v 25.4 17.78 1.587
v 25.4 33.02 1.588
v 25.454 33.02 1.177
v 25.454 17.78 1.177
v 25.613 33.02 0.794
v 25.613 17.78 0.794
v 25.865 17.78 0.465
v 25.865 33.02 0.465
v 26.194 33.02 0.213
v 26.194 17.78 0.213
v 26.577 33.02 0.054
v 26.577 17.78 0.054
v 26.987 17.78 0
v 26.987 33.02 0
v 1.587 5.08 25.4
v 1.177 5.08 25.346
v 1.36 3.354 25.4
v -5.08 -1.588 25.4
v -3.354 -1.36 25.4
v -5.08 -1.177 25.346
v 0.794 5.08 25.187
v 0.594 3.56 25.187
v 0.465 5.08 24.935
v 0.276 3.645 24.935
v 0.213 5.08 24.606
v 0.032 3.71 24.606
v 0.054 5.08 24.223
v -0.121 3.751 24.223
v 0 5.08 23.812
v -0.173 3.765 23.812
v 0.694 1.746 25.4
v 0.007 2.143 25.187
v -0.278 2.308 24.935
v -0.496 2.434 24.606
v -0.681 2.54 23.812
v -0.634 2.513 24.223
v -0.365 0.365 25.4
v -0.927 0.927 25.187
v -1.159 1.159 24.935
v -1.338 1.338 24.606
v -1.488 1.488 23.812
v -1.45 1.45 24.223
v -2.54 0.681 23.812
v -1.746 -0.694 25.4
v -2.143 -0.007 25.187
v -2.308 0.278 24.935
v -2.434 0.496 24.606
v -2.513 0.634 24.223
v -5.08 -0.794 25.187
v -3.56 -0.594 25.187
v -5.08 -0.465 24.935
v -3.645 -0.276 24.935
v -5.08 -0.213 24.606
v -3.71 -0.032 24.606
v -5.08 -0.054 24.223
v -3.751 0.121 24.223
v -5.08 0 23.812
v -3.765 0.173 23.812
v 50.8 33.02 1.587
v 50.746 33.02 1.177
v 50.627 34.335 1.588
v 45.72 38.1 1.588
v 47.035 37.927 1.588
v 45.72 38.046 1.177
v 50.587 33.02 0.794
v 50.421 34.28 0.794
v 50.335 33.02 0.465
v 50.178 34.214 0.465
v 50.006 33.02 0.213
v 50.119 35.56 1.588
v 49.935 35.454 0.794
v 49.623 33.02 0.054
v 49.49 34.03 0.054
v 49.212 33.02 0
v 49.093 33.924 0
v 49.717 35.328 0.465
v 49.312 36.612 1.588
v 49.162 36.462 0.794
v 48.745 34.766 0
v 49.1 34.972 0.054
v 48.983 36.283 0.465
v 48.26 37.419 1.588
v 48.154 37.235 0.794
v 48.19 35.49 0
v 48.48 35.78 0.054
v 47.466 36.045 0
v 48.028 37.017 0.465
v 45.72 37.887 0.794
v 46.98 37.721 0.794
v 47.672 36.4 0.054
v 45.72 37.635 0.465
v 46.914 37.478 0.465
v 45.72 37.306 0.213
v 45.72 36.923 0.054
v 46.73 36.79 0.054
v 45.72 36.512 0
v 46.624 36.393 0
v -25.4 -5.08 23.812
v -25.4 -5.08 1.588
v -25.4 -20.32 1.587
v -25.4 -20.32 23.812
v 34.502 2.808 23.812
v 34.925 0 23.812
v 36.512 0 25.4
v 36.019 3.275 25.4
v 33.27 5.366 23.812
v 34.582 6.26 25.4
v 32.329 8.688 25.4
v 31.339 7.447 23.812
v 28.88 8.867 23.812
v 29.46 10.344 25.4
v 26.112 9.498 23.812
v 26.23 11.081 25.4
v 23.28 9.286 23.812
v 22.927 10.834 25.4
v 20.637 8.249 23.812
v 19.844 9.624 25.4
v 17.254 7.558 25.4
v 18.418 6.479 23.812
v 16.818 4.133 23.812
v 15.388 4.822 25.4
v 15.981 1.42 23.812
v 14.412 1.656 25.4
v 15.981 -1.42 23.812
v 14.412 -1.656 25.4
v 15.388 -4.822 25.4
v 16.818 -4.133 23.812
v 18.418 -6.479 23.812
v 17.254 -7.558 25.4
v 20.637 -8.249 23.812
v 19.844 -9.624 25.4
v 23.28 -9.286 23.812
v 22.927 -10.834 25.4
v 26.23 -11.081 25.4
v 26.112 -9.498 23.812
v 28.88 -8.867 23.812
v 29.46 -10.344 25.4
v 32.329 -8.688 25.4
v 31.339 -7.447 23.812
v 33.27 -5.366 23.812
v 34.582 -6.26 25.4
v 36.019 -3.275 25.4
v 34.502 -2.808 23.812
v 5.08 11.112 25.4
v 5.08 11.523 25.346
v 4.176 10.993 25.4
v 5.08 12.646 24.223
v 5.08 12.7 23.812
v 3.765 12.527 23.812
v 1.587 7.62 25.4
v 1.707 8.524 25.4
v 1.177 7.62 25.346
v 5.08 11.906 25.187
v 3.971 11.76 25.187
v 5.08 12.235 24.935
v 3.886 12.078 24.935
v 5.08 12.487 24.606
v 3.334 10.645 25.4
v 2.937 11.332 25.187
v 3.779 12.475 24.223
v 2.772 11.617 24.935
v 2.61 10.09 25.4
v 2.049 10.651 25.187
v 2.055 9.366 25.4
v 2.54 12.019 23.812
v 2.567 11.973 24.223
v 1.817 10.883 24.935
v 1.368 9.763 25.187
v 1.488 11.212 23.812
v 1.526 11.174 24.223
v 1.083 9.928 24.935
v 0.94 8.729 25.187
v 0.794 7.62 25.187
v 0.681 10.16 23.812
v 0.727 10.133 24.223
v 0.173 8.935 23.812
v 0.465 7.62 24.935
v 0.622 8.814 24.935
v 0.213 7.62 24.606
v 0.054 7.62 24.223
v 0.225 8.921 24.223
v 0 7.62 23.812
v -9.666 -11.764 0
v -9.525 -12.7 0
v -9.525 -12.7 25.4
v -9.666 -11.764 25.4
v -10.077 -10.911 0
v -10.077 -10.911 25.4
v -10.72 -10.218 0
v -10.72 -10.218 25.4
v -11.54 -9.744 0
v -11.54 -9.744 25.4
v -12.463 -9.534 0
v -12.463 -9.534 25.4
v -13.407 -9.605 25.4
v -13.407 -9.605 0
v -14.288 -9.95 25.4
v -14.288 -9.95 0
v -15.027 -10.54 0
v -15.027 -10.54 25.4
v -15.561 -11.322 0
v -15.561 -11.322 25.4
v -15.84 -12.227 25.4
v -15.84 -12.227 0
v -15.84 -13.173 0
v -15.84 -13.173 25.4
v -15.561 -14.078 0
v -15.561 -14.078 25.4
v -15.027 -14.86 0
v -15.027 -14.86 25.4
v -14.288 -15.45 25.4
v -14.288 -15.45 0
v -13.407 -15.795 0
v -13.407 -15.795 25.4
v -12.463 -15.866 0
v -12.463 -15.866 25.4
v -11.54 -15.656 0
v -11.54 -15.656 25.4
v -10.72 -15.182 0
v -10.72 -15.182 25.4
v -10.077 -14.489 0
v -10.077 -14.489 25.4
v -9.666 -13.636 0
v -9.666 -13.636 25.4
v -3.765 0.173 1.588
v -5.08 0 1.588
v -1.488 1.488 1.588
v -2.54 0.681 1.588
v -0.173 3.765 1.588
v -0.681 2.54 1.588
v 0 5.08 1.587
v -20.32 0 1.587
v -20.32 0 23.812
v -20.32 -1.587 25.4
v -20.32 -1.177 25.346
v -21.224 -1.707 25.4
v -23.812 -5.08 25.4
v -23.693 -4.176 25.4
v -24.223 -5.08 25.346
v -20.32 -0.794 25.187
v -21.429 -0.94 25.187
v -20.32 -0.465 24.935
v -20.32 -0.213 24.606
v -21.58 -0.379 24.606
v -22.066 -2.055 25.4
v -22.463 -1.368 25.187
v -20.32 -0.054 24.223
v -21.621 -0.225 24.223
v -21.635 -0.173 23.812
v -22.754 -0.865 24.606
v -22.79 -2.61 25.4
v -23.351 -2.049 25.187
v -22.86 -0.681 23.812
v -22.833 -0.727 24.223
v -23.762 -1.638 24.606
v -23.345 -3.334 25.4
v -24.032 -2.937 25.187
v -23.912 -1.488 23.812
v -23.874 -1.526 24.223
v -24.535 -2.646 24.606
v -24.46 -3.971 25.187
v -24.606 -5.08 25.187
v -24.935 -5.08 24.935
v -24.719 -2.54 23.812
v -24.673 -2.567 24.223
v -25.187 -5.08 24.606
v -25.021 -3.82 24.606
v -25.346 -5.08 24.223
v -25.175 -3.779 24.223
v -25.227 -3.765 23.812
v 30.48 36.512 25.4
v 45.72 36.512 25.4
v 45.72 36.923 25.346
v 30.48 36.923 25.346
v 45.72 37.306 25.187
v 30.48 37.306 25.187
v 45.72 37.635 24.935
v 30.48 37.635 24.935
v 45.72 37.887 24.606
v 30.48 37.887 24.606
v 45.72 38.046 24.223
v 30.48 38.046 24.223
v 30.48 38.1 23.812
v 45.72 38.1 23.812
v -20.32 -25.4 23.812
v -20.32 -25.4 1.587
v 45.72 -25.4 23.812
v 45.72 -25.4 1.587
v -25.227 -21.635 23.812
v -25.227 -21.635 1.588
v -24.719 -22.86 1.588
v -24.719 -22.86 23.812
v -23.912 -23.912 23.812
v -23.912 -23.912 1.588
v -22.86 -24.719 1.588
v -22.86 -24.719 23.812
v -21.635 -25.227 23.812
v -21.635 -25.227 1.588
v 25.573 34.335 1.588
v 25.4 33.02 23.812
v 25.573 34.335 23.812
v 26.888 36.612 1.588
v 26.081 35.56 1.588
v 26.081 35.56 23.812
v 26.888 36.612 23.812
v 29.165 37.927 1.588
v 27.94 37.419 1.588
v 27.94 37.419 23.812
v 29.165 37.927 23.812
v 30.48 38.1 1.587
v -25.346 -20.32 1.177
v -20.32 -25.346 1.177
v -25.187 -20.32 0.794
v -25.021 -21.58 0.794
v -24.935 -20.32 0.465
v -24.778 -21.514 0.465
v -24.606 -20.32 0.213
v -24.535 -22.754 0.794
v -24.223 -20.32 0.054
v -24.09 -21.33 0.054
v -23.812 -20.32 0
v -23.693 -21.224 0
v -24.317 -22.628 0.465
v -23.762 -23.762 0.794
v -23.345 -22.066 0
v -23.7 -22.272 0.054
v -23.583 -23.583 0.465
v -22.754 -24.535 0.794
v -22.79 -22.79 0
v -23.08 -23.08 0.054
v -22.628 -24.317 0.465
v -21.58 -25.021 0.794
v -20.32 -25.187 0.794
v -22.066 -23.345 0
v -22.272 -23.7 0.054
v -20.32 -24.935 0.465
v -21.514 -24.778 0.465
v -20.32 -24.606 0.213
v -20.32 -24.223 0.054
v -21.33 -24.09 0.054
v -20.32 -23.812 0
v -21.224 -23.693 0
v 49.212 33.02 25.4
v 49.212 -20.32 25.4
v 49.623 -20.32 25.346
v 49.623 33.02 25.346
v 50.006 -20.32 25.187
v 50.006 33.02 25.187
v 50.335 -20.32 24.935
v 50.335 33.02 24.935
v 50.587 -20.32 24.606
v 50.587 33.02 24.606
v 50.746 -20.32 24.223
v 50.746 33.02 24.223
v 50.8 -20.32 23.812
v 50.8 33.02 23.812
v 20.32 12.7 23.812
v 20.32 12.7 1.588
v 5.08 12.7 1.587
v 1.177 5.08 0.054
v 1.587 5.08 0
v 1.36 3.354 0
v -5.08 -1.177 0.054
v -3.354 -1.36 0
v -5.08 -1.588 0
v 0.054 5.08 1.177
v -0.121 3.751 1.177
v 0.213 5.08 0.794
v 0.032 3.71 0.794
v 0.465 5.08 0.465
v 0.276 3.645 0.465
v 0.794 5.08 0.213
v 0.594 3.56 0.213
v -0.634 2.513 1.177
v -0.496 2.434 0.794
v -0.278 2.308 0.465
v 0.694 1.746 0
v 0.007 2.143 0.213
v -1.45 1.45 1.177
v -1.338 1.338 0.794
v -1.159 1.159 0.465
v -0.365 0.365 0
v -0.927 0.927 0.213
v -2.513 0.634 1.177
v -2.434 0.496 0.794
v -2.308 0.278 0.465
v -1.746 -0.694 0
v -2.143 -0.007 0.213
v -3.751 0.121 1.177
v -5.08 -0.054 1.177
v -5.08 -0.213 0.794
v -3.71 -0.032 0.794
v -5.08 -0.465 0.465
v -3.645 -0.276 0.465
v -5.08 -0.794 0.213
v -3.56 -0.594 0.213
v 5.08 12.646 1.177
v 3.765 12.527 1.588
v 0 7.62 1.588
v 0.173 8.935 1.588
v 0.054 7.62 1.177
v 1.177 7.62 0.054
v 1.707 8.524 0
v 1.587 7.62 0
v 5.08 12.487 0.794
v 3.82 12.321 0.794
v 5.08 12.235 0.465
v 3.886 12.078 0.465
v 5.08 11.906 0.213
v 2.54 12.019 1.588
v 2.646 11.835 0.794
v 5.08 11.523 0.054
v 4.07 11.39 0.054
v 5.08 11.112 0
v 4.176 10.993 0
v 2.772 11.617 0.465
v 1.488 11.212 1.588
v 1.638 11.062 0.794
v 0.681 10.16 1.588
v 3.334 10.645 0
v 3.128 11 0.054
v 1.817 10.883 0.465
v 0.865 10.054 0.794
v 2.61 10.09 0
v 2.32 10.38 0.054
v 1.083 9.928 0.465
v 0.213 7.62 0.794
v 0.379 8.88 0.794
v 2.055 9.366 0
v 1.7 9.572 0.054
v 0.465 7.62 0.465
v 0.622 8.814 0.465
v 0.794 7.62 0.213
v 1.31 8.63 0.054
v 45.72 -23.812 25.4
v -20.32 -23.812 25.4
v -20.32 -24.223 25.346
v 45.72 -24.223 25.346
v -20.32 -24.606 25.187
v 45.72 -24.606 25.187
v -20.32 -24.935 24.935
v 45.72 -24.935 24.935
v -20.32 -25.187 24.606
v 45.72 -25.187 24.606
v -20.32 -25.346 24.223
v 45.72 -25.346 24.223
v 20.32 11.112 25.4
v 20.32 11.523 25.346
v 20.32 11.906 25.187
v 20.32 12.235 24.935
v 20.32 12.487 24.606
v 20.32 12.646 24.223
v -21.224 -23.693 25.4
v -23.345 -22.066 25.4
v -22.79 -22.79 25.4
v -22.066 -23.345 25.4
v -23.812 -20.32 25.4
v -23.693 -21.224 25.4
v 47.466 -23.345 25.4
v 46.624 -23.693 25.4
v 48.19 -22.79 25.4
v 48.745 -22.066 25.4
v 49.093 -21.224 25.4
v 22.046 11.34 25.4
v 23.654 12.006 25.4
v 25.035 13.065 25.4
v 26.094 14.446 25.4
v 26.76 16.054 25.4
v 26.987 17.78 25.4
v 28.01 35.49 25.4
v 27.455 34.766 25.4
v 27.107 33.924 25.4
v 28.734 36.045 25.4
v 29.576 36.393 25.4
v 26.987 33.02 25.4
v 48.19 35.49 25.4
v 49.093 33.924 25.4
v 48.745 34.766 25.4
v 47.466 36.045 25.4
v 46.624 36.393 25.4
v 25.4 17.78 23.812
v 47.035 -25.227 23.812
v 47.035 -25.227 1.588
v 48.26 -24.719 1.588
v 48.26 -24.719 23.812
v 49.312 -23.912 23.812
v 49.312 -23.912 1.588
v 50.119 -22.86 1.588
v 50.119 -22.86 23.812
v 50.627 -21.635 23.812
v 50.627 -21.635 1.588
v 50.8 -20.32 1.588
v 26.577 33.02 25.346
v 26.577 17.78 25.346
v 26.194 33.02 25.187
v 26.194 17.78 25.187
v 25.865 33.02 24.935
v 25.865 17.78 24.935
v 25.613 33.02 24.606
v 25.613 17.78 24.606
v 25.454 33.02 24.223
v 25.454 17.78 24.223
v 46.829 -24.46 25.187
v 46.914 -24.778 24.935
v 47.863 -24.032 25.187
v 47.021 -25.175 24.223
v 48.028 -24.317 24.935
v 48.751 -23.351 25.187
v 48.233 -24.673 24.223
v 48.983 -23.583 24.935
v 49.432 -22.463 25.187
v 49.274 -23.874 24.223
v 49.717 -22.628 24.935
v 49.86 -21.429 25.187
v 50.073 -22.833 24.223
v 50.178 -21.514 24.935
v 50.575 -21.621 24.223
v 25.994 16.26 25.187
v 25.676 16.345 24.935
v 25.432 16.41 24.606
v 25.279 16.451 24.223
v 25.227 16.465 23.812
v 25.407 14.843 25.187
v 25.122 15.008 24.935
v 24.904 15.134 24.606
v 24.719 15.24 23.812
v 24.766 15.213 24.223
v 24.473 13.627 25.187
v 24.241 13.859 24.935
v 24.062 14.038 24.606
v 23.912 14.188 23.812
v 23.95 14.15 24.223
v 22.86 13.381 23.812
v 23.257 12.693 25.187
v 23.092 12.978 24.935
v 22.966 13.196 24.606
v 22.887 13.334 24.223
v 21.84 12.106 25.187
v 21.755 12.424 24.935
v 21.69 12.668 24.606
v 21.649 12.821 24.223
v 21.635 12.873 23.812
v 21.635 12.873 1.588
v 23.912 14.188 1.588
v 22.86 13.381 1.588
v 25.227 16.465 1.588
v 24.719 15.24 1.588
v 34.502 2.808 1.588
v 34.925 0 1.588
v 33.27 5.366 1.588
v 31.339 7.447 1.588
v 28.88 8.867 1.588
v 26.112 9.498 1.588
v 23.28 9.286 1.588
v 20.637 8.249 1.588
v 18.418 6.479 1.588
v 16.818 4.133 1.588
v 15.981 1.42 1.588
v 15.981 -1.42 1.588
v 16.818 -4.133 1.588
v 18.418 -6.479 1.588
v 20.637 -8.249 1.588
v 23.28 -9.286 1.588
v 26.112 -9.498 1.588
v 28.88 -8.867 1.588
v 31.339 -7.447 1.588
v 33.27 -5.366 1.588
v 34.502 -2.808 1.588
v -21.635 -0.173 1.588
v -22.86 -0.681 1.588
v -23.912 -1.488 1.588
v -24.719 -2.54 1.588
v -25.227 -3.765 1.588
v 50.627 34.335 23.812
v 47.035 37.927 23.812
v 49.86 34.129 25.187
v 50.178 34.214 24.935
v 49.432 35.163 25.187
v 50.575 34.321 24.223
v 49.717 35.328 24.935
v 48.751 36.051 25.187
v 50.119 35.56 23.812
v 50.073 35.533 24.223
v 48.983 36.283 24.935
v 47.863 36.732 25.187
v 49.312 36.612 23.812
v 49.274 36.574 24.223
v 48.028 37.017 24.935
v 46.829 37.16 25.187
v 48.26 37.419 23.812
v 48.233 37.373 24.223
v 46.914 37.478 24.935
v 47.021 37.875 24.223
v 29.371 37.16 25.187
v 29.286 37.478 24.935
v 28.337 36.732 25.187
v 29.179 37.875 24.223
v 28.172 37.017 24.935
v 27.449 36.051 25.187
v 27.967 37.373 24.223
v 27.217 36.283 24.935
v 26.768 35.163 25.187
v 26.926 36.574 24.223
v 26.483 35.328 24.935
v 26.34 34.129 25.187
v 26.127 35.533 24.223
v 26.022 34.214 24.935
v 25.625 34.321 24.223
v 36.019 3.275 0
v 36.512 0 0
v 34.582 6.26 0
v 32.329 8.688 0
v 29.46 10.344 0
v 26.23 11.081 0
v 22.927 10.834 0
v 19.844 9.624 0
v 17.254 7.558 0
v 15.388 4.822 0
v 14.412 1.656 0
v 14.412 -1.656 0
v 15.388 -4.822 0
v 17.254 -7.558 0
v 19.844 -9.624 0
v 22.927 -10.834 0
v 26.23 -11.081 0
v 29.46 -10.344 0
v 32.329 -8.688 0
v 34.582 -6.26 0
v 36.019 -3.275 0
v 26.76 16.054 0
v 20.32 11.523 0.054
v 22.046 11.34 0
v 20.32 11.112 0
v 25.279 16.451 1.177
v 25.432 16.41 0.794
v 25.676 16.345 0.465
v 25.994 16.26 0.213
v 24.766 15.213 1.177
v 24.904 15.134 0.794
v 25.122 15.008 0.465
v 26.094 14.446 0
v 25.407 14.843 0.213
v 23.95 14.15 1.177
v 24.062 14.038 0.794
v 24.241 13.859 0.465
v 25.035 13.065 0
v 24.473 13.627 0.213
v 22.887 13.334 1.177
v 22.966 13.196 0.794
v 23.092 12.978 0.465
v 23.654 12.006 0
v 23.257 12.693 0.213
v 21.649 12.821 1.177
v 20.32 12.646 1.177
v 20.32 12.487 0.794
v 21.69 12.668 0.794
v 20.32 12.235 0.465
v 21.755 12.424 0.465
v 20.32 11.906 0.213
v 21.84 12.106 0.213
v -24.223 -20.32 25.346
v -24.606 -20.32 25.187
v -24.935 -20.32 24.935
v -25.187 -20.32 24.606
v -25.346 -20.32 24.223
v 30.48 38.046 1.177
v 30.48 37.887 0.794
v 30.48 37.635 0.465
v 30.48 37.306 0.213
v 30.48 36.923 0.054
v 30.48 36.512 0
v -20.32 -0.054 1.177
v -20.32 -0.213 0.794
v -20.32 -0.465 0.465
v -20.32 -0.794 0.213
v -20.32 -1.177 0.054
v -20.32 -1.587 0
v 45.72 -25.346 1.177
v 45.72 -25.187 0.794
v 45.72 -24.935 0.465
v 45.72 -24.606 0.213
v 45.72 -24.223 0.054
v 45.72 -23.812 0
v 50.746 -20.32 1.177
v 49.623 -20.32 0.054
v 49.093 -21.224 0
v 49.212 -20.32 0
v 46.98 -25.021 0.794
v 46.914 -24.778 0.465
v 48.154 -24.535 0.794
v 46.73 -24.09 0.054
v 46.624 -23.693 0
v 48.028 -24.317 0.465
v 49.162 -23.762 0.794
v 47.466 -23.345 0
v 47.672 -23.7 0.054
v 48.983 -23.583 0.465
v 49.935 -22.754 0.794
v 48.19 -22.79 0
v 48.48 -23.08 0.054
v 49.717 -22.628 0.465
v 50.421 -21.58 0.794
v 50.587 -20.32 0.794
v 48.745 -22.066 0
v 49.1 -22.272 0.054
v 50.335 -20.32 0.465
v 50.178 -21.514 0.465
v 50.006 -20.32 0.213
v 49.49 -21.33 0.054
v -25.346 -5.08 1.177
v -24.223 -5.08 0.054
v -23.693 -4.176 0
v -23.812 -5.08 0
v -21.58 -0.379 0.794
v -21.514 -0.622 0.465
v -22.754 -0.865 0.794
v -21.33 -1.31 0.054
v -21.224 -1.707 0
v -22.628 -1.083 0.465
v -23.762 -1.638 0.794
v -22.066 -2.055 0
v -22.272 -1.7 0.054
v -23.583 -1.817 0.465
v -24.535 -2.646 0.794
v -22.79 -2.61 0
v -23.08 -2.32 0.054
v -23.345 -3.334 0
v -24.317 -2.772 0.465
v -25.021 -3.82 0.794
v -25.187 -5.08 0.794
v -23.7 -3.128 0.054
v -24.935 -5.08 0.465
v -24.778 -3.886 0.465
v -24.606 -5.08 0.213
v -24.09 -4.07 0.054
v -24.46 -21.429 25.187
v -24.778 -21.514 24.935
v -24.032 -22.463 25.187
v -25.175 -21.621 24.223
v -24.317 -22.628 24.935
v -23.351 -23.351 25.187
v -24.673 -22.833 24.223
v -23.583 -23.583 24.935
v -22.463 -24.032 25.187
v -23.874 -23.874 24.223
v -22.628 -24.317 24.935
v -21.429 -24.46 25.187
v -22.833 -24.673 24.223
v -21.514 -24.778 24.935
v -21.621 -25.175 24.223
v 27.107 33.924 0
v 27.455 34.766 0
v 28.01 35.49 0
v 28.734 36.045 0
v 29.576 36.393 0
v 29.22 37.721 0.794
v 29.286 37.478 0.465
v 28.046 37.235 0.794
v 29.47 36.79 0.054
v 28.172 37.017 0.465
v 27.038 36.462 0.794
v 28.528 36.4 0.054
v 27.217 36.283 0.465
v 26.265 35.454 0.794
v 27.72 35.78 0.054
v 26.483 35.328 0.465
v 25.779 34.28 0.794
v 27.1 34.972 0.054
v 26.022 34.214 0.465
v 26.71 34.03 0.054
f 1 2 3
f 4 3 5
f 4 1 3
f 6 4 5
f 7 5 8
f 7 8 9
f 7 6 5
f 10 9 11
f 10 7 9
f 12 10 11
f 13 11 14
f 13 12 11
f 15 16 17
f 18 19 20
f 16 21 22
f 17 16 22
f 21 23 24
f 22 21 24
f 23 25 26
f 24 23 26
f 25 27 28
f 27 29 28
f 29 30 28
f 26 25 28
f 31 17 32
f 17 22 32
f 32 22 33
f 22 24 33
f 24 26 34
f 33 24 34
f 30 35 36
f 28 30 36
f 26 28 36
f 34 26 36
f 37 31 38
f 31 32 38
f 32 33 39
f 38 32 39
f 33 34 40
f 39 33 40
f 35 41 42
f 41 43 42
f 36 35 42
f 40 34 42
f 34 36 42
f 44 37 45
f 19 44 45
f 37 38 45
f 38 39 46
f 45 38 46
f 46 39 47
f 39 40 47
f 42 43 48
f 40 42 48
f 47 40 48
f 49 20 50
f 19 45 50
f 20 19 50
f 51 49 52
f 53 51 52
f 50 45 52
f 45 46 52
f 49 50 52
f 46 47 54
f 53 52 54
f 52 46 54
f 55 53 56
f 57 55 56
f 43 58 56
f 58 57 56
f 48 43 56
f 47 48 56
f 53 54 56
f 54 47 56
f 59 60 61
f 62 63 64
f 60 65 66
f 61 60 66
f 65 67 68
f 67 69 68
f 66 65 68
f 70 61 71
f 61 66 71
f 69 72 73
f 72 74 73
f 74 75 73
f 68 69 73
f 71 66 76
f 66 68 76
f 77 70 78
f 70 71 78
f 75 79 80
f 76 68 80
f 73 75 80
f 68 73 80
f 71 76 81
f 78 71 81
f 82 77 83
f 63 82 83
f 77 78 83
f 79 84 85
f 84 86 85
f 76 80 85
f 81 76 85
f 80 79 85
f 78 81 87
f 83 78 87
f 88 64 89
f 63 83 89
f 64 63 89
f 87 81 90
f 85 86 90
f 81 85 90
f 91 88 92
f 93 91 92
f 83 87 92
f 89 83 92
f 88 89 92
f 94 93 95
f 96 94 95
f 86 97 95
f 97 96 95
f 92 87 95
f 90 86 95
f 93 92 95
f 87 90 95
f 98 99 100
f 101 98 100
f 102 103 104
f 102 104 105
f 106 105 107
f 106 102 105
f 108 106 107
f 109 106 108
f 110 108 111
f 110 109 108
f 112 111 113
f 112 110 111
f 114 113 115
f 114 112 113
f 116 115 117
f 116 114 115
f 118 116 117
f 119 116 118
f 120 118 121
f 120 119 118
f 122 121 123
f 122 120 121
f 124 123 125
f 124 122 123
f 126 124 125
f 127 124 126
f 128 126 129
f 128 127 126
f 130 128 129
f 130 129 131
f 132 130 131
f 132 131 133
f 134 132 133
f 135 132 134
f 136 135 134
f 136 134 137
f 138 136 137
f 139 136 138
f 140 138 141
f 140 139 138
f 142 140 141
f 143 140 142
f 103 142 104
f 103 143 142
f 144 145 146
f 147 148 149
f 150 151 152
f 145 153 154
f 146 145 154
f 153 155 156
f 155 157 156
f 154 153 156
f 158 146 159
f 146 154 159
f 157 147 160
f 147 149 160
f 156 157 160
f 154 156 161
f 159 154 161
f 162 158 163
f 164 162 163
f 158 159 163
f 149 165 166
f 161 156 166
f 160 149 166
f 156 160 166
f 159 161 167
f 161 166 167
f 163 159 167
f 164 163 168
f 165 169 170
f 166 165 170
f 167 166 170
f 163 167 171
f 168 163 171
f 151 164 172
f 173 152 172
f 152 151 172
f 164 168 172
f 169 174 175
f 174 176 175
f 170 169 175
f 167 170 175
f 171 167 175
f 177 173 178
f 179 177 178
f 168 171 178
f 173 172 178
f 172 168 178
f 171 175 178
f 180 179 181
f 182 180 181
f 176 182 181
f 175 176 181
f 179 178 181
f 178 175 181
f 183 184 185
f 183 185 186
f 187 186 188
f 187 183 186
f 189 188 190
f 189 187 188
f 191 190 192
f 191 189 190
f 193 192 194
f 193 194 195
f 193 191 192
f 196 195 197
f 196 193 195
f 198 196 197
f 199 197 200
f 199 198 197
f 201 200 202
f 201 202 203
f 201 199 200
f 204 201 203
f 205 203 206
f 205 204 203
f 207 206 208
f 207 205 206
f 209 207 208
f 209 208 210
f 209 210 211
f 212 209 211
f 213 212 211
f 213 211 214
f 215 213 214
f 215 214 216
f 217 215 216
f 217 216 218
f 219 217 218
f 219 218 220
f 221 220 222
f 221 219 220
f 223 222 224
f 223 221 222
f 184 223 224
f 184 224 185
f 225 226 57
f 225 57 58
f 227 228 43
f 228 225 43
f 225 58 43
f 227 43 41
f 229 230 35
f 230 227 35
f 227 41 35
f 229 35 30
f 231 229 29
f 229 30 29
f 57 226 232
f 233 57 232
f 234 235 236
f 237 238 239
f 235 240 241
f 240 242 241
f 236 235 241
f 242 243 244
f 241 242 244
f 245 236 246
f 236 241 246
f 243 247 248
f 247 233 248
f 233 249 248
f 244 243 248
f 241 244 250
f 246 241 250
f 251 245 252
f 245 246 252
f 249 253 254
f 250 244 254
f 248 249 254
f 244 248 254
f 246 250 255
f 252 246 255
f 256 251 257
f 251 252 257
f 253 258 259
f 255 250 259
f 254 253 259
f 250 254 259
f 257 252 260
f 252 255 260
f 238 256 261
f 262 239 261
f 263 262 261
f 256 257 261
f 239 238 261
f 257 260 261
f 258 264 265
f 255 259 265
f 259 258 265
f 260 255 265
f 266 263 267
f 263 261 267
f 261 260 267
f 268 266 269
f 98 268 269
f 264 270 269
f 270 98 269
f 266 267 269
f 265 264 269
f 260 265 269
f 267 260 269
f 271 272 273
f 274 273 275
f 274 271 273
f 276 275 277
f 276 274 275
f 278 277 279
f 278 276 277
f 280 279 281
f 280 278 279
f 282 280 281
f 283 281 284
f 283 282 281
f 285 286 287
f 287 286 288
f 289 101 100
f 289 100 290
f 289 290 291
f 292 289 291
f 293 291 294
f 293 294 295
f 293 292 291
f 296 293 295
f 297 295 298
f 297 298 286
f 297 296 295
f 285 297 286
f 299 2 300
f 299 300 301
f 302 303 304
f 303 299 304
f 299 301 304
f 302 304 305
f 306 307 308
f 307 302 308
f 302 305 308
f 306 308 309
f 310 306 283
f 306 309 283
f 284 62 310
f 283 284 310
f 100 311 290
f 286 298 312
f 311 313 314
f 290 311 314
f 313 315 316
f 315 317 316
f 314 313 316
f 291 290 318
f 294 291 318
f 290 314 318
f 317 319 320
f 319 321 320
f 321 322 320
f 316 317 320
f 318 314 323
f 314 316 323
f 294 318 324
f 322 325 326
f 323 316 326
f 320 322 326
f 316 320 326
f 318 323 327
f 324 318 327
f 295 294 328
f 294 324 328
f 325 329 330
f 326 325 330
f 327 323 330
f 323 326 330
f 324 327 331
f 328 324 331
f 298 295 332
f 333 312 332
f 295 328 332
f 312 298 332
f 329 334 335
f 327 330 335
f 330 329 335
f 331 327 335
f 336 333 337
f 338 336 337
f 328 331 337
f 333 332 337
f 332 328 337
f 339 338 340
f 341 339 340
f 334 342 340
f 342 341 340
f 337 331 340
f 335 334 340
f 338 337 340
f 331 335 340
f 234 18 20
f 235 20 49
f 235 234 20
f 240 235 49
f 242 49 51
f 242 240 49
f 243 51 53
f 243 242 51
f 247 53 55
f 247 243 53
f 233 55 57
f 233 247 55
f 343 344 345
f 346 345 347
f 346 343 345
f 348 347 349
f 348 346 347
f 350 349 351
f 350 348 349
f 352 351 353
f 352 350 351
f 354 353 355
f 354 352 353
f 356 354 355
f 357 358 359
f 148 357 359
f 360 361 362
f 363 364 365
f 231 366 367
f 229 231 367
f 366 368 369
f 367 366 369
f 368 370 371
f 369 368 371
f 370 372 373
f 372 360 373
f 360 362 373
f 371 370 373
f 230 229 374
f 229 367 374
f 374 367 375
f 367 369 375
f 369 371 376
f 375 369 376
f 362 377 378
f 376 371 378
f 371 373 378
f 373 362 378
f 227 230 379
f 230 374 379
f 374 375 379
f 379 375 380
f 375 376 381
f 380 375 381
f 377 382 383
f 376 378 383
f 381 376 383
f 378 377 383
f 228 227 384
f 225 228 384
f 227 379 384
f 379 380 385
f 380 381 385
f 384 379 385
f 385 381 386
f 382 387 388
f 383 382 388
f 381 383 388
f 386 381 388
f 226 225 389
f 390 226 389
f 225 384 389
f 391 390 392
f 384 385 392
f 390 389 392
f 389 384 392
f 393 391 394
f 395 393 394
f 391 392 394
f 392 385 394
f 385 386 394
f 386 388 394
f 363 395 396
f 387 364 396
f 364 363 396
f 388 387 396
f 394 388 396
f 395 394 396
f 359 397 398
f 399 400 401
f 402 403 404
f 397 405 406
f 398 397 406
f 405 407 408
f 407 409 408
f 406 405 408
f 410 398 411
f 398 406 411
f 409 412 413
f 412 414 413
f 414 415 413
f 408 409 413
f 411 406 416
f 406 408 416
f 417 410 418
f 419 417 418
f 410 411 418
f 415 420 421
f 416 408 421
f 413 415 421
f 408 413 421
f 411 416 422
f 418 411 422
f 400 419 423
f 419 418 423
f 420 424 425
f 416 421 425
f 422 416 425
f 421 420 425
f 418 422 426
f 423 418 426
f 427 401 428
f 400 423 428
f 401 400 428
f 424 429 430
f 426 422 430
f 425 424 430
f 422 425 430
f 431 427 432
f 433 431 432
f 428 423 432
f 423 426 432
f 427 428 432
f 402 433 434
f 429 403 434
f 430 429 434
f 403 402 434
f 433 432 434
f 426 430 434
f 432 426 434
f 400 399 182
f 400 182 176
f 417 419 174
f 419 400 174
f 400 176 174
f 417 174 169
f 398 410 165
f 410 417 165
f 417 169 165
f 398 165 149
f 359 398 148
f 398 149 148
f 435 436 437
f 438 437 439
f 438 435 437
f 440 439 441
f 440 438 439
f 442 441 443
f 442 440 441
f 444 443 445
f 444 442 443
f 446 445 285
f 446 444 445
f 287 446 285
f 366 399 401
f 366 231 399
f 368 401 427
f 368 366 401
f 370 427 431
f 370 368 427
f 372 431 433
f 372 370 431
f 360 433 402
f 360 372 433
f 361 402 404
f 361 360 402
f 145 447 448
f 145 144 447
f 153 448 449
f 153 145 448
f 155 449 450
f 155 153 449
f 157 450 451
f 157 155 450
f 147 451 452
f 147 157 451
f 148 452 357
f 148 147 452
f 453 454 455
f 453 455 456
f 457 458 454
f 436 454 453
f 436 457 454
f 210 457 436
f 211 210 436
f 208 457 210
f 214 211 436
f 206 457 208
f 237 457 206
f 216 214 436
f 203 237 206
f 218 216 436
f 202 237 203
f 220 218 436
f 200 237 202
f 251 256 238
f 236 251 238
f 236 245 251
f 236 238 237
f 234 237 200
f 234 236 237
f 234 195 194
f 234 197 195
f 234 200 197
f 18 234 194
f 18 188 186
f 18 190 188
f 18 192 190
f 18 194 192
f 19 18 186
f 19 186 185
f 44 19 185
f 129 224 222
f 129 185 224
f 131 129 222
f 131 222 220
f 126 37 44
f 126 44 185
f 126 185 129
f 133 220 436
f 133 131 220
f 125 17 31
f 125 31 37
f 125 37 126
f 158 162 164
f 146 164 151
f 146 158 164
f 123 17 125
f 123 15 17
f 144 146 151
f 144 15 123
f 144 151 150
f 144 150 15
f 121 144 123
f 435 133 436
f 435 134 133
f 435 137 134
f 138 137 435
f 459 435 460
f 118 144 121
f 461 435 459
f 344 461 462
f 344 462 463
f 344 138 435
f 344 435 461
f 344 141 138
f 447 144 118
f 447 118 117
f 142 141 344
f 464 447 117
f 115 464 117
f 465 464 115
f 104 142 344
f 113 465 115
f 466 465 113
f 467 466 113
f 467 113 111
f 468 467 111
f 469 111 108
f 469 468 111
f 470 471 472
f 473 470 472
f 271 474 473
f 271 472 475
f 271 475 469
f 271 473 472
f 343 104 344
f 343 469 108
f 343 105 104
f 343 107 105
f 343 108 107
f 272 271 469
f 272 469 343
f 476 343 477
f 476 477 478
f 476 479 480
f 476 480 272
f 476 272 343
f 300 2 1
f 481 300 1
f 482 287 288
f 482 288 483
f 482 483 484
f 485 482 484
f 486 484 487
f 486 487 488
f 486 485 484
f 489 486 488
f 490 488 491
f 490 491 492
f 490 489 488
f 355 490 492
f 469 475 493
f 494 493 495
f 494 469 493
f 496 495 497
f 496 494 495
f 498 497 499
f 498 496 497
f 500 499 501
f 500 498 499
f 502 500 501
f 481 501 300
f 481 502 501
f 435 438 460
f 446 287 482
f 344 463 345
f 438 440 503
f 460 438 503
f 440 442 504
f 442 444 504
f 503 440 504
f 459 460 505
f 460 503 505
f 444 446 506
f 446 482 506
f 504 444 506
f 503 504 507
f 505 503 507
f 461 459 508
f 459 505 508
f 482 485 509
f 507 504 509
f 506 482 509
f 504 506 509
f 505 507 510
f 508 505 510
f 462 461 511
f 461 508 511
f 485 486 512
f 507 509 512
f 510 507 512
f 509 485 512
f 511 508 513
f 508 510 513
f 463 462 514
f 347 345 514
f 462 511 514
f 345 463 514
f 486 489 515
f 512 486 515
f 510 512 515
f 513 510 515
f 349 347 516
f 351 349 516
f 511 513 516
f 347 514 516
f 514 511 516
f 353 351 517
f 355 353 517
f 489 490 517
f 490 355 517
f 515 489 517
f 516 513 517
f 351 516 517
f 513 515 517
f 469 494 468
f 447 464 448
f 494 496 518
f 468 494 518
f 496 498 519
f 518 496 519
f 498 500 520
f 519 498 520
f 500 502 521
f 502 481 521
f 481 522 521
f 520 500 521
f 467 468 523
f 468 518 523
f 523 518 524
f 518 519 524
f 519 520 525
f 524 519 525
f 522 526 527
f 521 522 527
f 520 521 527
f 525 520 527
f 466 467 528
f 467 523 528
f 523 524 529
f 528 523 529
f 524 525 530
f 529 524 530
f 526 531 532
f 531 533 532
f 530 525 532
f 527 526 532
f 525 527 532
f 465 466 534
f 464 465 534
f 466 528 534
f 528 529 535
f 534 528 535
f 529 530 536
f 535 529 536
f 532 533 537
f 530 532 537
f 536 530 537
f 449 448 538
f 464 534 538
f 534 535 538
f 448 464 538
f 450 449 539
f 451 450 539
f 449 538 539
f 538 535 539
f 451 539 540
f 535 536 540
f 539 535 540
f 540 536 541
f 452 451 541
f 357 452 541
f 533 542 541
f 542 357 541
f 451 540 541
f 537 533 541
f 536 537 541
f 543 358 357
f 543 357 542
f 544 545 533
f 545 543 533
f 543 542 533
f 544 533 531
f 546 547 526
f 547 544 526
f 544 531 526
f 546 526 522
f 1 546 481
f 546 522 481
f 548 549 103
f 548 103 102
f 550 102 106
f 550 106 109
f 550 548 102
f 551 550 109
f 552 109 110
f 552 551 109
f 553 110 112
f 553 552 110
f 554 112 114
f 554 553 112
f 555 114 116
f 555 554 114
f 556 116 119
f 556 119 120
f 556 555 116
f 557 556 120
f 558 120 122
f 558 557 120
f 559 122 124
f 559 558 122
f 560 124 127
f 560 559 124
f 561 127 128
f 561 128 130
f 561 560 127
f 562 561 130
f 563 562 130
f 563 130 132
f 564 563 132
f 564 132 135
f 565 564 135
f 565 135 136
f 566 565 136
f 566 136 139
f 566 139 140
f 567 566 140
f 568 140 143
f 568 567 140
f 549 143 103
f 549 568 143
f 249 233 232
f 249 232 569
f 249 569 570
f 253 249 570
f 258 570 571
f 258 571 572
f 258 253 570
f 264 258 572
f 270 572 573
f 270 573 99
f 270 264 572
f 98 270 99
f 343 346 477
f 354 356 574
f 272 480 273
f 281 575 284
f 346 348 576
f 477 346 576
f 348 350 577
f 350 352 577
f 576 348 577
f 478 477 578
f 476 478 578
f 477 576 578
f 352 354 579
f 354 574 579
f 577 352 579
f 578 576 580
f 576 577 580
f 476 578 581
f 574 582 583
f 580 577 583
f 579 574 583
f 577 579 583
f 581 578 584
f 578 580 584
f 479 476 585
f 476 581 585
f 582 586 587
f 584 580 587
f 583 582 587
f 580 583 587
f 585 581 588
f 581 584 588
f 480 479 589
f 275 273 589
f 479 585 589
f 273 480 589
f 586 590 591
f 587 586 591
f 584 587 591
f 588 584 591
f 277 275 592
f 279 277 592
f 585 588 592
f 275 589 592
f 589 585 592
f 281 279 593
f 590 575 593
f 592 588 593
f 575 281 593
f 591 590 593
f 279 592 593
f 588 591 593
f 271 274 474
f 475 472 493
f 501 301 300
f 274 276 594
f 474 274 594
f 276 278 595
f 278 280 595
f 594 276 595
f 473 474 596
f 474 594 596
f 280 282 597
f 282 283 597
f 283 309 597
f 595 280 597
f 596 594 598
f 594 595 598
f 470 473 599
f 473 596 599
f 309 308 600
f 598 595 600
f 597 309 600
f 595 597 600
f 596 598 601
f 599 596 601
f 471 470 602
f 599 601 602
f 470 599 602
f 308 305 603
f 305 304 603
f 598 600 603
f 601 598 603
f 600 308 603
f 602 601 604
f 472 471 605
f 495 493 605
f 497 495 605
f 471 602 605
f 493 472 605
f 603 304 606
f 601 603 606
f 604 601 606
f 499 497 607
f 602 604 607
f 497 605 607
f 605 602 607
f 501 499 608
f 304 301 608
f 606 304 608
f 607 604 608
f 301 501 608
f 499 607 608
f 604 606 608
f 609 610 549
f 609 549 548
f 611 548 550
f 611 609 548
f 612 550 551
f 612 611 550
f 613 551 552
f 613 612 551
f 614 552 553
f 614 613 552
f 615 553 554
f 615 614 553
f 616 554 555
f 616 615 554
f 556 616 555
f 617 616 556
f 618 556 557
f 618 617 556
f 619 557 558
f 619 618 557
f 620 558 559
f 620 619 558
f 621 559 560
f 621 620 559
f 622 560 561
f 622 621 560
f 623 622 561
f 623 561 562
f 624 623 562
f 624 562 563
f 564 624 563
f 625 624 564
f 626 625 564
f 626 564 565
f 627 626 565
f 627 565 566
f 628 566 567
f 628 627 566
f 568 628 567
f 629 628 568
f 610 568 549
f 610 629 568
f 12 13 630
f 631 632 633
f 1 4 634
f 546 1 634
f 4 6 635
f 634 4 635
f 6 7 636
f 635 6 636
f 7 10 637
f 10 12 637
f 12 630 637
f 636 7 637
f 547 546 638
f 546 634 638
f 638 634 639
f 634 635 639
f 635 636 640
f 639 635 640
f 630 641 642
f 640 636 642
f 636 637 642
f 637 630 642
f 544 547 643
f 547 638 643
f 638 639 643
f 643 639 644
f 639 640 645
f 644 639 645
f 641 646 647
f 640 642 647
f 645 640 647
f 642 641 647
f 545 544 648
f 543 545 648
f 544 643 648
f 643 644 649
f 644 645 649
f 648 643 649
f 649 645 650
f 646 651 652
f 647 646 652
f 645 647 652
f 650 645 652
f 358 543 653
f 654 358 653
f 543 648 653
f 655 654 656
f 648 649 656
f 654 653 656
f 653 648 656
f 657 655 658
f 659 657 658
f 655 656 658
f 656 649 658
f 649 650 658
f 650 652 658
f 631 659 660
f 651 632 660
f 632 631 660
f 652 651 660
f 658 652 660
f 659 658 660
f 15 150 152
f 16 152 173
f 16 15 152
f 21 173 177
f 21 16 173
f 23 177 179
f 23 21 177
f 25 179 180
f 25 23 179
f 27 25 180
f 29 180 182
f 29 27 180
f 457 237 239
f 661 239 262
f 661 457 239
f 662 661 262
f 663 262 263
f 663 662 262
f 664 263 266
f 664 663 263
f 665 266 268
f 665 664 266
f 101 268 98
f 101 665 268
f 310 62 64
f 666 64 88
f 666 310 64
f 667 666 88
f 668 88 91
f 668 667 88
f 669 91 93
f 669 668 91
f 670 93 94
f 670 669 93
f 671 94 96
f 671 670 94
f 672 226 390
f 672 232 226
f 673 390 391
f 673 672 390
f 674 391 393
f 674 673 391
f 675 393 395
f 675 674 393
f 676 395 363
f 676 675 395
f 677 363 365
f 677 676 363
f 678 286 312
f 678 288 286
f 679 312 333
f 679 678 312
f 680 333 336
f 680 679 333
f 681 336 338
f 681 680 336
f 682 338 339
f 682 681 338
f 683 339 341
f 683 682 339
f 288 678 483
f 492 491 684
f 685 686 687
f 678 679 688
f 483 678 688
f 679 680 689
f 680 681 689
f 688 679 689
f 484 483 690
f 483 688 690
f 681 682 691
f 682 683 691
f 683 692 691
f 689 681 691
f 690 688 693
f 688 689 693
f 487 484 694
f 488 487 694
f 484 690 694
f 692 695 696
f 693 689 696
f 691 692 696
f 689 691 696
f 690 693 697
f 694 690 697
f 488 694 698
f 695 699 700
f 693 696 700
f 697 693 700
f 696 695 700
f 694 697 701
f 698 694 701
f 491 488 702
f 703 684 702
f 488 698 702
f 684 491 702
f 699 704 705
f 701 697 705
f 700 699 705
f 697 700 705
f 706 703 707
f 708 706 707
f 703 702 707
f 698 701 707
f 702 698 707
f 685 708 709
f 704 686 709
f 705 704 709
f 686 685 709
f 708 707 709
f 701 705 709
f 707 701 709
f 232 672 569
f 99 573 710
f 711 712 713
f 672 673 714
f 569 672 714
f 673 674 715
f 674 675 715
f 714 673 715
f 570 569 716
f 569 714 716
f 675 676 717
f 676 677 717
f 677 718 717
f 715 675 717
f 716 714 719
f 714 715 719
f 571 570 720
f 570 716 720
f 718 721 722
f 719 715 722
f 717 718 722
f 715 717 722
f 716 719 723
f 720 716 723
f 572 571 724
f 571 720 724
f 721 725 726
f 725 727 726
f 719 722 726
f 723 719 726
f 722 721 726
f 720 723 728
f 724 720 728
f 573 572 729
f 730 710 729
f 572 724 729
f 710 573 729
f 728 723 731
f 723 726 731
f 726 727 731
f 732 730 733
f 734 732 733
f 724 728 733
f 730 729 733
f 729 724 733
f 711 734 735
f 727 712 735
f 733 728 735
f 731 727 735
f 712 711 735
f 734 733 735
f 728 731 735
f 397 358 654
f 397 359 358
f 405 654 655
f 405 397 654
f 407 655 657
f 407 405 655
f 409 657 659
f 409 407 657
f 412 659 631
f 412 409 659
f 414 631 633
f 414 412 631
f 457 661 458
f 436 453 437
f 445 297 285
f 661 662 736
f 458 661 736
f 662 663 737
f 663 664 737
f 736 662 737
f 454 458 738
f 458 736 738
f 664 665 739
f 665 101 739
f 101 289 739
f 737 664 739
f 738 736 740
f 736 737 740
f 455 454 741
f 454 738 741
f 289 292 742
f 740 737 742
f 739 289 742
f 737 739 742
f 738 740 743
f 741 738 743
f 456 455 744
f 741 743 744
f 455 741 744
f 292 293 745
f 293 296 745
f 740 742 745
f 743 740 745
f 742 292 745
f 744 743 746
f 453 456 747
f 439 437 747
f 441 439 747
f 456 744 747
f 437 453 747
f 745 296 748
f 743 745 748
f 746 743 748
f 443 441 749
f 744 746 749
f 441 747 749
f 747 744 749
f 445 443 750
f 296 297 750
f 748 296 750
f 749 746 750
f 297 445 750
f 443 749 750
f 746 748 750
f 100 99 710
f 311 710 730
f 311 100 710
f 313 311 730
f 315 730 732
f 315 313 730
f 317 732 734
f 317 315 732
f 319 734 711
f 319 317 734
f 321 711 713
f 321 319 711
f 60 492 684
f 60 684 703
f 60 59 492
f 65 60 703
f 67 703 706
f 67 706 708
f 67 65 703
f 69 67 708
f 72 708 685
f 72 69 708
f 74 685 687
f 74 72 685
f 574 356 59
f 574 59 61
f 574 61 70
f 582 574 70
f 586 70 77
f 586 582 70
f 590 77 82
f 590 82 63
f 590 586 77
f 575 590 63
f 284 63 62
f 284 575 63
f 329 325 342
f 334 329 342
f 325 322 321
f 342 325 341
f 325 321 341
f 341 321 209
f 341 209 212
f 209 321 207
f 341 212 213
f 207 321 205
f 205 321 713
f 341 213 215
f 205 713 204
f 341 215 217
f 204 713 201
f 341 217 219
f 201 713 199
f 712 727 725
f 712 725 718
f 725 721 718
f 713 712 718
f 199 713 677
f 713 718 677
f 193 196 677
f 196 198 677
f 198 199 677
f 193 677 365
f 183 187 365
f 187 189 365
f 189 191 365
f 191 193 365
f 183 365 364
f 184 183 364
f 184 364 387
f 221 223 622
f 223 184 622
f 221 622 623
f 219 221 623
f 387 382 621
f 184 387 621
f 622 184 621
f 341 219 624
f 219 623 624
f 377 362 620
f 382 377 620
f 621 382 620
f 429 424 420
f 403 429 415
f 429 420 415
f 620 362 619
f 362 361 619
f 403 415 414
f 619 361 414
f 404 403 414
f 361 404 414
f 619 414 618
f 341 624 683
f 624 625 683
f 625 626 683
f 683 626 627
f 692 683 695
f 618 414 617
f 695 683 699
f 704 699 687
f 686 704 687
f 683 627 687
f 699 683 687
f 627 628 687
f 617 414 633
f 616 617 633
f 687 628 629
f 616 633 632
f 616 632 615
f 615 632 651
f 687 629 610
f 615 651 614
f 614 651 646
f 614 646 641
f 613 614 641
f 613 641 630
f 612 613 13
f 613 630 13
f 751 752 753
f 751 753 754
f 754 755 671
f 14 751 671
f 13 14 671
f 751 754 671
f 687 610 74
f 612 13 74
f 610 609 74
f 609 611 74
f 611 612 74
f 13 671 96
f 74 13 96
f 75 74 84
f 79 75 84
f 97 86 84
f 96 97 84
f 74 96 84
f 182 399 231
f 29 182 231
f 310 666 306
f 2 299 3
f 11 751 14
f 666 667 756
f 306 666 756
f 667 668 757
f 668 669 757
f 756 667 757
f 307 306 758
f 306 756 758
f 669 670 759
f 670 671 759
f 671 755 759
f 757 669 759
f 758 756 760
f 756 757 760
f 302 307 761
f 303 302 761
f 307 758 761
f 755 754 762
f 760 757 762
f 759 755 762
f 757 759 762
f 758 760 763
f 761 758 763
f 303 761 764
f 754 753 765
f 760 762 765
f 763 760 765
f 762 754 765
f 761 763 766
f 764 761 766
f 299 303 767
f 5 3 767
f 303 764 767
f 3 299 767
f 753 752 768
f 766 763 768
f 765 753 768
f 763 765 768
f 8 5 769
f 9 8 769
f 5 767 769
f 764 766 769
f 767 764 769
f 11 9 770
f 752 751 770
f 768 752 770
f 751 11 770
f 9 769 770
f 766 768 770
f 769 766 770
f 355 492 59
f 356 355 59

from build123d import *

# Parameters (mm, degrees)
F0_R     = 3.175
F0_R_2   = 9.525
F1_DEPTH = 25.4
F2_R     = 5.08
F3_SIZE  = 1.5875
F4_R     = 1.5875
F5_SIZE  = 1.5875


with BuildPart() as f1:
    # F0 (on Top) → F1 (new body)
    with BuildSketch(Plane.XY):
        Polygon((0, 0), (-25.4, 0), (-25.4, -25.4), (50.8, -25.4), (50.8, 38.1), (25.4, 38.1), (25.4, 12.7), (0, 12.7), align=None)
        with Locations((-12.7, -12.7)):
            Circle(F0_R, mode=Mode.SUBTRACT)
        with Locations((25.4, 0)):
            Circle(F0_R_2, mode=Mode.SUBTRACT)
    extrude(amount=F1_DEPTH)

    # F2
    f2_edges = [f1.edges().sort_by_distance(p)[0] for p in [
        (50.8, 38.1, 12.7),
        (25.4, 38.1, 12.7),
        (25.4, 12.7, 12.7),
        (0, 12.7, 12.7),
        (0, 0, 12.7),
        (-25.4, 0, 12.7),
        (-25.4, -25.4, 12.7),
        (50.8, -25.4, 12.7),
    ]]
    fillet(f2_edges, radius=F2_R)

    # F3
    f3_edges = [f1.edges().sort_by_distance(p)[0] for p in [
        (15.875, 0, 25.4),
    ]]
    chamfer(f3_edges, length=F3_SIZE)

    # F4
    f4_edges = [f1.edges().sort_by_distance(p)[0] for p in [
        (-25.4, -12.7, 25.4),
        (12.7, -25.4, 0),
    ]]
    fillet(f4_edges, radius=F4_R)

    # F5
    f5_edges = [f1.edges().sort_by_distance(p)[0] for p in [
        (15.875, 0, 0),
    ]]
    chamfer(f5_edges, length=F5_SIZE)


solid = f1.part
